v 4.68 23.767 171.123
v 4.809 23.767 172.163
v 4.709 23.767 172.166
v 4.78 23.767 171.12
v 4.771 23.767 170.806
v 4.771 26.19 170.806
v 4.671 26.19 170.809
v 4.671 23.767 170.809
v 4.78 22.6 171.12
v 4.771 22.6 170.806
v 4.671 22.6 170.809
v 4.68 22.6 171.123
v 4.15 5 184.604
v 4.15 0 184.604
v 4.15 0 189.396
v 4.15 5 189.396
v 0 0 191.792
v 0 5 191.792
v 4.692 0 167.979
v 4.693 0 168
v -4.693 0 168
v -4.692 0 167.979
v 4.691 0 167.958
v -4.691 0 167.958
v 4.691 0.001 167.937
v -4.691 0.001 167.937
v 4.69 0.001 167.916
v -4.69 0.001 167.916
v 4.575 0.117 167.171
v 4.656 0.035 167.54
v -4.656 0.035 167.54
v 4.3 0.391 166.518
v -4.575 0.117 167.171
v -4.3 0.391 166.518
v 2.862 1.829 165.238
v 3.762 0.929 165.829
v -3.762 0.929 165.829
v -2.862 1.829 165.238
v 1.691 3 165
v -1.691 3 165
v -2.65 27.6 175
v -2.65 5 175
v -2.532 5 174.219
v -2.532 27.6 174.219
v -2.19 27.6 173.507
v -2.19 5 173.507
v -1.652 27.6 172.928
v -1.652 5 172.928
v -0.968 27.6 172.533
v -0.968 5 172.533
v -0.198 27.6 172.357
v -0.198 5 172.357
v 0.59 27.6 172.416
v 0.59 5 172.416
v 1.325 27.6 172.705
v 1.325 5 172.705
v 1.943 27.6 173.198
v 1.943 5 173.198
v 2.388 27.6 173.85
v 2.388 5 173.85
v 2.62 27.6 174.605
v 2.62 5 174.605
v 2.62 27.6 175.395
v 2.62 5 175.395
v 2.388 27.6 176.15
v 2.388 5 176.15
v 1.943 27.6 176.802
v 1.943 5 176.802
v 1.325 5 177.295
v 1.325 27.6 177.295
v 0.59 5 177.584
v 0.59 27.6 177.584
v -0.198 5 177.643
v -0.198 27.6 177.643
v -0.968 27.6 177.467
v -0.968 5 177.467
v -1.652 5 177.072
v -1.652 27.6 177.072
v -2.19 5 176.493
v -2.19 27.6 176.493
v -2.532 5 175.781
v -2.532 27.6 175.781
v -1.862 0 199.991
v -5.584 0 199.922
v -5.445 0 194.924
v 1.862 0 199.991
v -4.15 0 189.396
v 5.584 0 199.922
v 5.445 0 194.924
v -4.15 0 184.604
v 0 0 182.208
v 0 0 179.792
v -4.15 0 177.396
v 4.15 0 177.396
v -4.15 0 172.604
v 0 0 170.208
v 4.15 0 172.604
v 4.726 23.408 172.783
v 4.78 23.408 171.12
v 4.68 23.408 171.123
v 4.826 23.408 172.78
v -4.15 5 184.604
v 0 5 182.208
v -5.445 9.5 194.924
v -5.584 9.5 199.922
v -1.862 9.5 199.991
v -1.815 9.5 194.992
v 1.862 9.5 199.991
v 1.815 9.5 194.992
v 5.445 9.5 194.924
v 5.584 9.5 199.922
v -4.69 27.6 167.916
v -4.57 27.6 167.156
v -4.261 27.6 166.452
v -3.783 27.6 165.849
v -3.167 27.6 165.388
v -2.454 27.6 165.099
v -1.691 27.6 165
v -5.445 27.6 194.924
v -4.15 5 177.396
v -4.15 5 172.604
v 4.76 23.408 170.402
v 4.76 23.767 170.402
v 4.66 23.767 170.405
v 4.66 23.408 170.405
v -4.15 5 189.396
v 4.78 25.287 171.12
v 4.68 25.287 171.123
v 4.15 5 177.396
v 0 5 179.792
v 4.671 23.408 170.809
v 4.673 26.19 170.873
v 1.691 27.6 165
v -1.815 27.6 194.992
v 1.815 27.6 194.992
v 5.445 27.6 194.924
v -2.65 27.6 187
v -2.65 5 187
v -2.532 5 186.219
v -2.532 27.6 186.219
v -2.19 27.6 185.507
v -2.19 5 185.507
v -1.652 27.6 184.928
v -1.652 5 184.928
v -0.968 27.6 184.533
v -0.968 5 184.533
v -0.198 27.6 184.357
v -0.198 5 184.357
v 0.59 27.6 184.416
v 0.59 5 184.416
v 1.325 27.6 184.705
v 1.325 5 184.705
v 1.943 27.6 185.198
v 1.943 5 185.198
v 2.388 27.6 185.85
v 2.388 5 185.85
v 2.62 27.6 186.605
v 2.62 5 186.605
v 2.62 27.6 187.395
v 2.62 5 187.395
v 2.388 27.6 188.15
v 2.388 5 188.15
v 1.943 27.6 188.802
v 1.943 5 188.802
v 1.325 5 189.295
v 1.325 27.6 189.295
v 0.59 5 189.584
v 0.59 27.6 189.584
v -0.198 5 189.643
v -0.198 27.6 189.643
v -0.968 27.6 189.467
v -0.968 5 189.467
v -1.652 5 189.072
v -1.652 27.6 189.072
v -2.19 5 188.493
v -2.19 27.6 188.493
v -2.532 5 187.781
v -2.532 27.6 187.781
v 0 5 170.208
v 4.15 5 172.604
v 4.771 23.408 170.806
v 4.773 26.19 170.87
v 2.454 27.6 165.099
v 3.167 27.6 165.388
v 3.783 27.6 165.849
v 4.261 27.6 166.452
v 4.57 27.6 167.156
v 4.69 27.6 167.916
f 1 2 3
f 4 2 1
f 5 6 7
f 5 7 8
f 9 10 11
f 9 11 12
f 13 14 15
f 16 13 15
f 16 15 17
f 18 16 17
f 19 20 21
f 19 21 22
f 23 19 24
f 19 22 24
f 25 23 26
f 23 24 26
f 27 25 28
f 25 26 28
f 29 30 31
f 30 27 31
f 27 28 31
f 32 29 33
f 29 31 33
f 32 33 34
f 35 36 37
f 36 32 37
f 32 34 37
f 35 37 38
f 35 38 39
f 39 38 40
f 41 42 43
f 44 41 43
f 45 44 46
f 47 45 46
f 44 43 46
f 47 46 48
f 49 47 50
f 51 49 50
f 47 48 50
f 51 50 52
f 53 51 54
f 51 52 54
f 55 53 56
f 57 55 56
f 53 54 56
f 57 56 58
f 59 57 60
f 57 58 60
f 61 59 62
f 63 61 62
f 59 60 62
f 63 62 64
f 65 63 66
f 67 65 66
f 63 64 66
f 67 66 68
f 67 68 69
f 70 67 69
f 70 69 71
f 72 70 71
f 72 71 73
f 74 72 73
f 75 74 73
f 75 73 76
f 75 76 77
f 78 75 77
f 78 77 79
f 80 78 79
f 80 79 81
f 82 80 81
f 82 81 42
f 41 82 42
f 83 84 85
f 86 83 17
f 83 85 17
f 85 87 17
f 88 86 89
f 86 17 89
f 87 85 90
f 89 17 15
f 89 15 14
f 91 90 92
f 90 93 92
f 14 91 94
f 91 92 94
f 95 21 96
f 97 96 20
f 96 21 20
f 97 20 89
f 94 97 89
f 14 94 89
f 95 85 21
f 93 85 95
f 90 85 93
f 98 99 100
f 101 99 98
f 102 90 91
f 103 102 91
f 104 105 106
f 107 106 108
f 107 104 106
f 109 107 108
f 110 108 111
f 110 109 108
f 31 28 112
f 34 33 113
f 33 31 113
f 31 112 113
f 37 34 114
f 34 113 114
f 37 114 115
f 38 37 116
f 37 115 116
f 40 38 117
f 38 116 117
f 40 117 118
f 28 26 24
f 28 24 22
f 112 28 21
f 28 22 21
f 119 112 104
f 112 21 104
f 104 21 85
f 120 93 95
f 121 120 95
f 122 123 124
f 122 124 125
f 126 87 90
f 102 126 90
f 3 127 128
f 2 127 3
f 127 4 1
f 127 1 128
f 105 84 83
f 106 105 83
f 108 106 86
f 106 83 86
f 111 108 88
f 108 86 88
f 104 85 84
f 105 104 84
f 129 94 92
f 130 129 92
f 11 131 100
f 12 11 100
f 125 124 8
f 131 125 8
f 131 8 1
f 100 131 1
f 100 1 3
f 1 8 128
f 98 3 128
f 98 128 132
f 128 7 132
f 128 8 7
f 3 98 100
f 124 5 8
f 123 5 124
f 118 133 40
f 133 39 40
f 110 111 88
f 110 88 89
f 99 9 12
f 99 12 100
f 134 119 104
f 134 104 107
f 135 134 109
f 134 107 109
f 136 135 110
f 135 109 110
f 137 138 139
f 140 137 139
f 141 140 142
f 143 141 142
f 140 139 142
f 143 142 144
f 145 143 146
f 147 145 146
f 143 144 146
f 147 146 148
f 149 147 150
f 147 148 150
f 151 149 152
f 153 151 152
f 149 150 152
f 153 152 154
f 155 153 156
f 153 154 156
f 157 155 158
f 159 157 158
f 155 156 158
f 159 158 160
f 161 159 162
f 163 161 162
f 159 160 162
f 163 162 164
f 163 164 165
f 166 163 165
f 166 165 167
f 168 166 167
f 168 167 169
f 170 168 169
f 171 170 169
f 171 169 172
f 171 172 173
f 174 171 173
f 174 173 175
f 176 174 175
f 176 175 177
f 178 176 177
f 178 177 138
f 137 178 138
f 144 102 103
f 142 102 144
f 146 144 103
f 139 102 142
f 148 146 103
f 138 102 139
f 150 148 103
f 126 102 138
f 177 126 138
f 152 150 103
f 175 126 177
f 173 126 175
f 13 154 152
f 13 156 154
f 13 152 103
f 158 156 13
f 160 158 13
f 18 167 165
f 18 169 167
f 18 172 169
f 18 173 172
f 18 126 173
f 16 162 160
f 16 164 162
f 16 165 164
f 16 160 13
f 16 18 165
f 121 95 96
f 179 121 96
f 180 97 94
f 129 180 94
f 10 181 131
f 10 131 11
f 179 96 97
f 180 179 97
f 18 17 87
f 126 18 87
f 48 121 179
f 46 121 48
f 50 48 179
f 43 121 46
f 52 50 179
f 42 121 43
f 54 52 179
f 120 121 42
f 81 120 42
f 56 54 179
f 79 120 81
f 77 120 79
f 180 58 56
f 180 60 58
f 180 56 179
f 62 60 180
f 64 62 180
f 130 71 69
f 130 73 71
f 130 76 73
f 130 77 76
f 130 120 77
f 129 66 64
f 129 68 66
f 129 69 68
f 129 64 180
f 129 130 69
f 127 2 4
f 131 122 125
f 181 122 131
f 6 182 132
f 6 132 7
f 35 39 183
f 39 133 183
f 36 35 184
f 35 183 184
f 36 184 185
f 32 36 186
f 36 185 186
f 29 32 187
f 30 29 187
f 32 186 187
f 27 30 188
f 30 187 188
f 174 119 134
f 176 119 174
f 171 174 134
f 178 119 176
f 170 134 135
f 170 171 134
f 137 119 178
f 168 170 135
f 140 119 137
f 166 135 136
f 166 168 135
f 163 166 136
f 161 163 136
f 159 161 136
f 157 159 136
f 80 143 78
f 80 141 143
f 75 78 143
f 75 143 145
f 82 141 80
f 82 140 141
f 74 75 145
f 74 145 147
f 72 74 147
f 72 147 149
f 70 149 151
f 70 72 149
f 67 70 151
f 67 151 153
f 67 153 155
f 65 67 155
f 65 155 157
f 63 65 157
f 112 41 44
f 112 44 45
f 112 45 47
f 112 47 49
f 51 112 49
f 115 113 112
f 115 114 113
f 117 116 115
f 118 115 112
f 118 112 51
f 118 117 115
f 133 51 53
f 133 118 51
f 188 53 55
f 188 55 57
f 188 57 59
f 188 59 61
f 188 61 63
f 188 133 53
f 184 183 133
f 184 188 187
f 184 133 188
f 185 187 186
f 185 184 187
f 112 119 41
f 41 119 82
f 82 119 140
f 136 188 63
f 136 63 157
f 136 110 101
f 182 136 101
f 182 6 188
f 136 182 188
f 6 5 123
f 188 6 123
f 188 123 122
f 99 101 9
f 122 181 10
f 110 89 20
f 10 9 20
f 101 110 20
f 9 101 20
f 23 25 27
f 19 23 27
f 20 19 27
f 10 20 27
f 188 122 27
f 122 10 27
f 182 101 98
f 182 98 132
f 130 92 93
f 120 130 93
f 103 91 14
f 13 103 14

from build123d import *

# Parameters (mm, degrees)
EXTRUDE_590_DEPTH   = 27.6
EXTRUDE_638_DEPTH   = 9.5
FILLET_1_R          = 3
HOLE_WIZARD_M5_1_D  = 5.3
CUT_EXTRUDE_1_DEPTH = 5
CUT_EXTRUDE_2_DEPTH = 0.1


with BuildPart() as part:
    # 草图1 → Extrude 590 (new body)
    with BuildSketch(Plane(origin=(0, 0, 0), x_dir=(1, 0, 0), z_dir=(0, 1, 0))):
        with BuildLine():
            Line((4.608867317, -165), (-4.608867317, -165))
            Line((-4.608867317, -165), (-5.444719551, -194.923972433))
            ThreePointArc((-5.444719551, -194.923972433), (0, -195), (5.444719551, -194.923972433))
            Line((5.444719551, -194.923972433), (4.608867317, -165))
        make_face()
    extrude(amount=EXTRUDE_590_DEPTH)

    # 草图1<3> → Extrude 638 (add)
    with BuildSketch(Plane(origin=(0, 0, 0), x_dir=(1, 0, 0), z_dir=(0, 1, 0))):
        with BuildLine():
            ThreePointArc((5.444719551, -194.923972433), (0, -195), (-5.444719551, -194.923972433))
            Line((-5.444719551, -194.923972433), (-5.584327745, -199.922023008))
            ThreePointArc((-5.584327745, -199.922023008), (0, -200), (5.584327745, -199.922023008))
            Line((5.584327745, -199.922023008), (5.444719551, -194.923972433))
        make_face()
    extrude(amount=EXTRUDE_638_DEPTH)

    # 圆角1
    fillet_1_edges = [part.edges().sort_by_distance(p)[0] for p in [
        (0, 0, 165),
        (-4.608867317, 13.8, 165),
        (4.608867317, 13.8, 165),
    ]]
    fillet(fillet_1_edges, radius=FILLET_1_R)

    # M5 间隙孔1 (through all)
    with Locations(Plane(origin=(0, 27.6, 0), x_dir=(1, 0, 0), z_dir=(0, 1, 0))):
        with Locations((0, -187), (0, -175)):
            Hole(HOLE_WIZARD_M5_1_D / 2)

    # 草图6 → 切除-拉伸1 (cut)
    with BuildSketch(Plane.XZ):
        Polygon((0, 179.792007234), (-4.15, 177.396003617), (-4.15, 172.603996383), (0, 170.207992766), (4.15, 172.603996383), (4.15, 177.396003617), align=None)
        Polygon((0, 191.792007234), (-4.15, 189.396003617), (-4.15, 184.603996383), (0, 182.207992766), (4.15, 184.603996383), (4.15, 189.396003617), align=None)
    extrude(amount=-CUT_EXTRUDE_1_DEPTH, mode=Mode.SUBTRACT)

    # 草图7 → 切除-拉伸2 (cut)
    with BuildSketch(Plane(origin=(0, 0, 0), x_dir=(-0.02792163872356911, 0, -0.9996101150403545), z_dir=(0.9996101150403545, 0, -0.02792163872356911))):
        Polygon((-170.936556358, 26.18974359), (-170.872754274, 26.18974359), (-170.872754274, 23.766666667), (-170.46890812, 23.766666667), (-170.46890812, 23.407692308), (-170.872754274, 23.407692308), (-170.872754274, 22.6), (-171.186856838, 22.6), (-171.186856838, 23.407692308), (-172.847113249, 23.407692308), align=None)
        Polygon((-171.186856838, 23.766666667), (-171.186856838, 25.286698718), (-172.230126069, 23.766666667), align=None, mode=Mode.SUBTRACT)
    extrude(amount=-CUT_EXTRUDE_2_DEPTH, mode=Mode.SUBTRACT)


solid = part.part
